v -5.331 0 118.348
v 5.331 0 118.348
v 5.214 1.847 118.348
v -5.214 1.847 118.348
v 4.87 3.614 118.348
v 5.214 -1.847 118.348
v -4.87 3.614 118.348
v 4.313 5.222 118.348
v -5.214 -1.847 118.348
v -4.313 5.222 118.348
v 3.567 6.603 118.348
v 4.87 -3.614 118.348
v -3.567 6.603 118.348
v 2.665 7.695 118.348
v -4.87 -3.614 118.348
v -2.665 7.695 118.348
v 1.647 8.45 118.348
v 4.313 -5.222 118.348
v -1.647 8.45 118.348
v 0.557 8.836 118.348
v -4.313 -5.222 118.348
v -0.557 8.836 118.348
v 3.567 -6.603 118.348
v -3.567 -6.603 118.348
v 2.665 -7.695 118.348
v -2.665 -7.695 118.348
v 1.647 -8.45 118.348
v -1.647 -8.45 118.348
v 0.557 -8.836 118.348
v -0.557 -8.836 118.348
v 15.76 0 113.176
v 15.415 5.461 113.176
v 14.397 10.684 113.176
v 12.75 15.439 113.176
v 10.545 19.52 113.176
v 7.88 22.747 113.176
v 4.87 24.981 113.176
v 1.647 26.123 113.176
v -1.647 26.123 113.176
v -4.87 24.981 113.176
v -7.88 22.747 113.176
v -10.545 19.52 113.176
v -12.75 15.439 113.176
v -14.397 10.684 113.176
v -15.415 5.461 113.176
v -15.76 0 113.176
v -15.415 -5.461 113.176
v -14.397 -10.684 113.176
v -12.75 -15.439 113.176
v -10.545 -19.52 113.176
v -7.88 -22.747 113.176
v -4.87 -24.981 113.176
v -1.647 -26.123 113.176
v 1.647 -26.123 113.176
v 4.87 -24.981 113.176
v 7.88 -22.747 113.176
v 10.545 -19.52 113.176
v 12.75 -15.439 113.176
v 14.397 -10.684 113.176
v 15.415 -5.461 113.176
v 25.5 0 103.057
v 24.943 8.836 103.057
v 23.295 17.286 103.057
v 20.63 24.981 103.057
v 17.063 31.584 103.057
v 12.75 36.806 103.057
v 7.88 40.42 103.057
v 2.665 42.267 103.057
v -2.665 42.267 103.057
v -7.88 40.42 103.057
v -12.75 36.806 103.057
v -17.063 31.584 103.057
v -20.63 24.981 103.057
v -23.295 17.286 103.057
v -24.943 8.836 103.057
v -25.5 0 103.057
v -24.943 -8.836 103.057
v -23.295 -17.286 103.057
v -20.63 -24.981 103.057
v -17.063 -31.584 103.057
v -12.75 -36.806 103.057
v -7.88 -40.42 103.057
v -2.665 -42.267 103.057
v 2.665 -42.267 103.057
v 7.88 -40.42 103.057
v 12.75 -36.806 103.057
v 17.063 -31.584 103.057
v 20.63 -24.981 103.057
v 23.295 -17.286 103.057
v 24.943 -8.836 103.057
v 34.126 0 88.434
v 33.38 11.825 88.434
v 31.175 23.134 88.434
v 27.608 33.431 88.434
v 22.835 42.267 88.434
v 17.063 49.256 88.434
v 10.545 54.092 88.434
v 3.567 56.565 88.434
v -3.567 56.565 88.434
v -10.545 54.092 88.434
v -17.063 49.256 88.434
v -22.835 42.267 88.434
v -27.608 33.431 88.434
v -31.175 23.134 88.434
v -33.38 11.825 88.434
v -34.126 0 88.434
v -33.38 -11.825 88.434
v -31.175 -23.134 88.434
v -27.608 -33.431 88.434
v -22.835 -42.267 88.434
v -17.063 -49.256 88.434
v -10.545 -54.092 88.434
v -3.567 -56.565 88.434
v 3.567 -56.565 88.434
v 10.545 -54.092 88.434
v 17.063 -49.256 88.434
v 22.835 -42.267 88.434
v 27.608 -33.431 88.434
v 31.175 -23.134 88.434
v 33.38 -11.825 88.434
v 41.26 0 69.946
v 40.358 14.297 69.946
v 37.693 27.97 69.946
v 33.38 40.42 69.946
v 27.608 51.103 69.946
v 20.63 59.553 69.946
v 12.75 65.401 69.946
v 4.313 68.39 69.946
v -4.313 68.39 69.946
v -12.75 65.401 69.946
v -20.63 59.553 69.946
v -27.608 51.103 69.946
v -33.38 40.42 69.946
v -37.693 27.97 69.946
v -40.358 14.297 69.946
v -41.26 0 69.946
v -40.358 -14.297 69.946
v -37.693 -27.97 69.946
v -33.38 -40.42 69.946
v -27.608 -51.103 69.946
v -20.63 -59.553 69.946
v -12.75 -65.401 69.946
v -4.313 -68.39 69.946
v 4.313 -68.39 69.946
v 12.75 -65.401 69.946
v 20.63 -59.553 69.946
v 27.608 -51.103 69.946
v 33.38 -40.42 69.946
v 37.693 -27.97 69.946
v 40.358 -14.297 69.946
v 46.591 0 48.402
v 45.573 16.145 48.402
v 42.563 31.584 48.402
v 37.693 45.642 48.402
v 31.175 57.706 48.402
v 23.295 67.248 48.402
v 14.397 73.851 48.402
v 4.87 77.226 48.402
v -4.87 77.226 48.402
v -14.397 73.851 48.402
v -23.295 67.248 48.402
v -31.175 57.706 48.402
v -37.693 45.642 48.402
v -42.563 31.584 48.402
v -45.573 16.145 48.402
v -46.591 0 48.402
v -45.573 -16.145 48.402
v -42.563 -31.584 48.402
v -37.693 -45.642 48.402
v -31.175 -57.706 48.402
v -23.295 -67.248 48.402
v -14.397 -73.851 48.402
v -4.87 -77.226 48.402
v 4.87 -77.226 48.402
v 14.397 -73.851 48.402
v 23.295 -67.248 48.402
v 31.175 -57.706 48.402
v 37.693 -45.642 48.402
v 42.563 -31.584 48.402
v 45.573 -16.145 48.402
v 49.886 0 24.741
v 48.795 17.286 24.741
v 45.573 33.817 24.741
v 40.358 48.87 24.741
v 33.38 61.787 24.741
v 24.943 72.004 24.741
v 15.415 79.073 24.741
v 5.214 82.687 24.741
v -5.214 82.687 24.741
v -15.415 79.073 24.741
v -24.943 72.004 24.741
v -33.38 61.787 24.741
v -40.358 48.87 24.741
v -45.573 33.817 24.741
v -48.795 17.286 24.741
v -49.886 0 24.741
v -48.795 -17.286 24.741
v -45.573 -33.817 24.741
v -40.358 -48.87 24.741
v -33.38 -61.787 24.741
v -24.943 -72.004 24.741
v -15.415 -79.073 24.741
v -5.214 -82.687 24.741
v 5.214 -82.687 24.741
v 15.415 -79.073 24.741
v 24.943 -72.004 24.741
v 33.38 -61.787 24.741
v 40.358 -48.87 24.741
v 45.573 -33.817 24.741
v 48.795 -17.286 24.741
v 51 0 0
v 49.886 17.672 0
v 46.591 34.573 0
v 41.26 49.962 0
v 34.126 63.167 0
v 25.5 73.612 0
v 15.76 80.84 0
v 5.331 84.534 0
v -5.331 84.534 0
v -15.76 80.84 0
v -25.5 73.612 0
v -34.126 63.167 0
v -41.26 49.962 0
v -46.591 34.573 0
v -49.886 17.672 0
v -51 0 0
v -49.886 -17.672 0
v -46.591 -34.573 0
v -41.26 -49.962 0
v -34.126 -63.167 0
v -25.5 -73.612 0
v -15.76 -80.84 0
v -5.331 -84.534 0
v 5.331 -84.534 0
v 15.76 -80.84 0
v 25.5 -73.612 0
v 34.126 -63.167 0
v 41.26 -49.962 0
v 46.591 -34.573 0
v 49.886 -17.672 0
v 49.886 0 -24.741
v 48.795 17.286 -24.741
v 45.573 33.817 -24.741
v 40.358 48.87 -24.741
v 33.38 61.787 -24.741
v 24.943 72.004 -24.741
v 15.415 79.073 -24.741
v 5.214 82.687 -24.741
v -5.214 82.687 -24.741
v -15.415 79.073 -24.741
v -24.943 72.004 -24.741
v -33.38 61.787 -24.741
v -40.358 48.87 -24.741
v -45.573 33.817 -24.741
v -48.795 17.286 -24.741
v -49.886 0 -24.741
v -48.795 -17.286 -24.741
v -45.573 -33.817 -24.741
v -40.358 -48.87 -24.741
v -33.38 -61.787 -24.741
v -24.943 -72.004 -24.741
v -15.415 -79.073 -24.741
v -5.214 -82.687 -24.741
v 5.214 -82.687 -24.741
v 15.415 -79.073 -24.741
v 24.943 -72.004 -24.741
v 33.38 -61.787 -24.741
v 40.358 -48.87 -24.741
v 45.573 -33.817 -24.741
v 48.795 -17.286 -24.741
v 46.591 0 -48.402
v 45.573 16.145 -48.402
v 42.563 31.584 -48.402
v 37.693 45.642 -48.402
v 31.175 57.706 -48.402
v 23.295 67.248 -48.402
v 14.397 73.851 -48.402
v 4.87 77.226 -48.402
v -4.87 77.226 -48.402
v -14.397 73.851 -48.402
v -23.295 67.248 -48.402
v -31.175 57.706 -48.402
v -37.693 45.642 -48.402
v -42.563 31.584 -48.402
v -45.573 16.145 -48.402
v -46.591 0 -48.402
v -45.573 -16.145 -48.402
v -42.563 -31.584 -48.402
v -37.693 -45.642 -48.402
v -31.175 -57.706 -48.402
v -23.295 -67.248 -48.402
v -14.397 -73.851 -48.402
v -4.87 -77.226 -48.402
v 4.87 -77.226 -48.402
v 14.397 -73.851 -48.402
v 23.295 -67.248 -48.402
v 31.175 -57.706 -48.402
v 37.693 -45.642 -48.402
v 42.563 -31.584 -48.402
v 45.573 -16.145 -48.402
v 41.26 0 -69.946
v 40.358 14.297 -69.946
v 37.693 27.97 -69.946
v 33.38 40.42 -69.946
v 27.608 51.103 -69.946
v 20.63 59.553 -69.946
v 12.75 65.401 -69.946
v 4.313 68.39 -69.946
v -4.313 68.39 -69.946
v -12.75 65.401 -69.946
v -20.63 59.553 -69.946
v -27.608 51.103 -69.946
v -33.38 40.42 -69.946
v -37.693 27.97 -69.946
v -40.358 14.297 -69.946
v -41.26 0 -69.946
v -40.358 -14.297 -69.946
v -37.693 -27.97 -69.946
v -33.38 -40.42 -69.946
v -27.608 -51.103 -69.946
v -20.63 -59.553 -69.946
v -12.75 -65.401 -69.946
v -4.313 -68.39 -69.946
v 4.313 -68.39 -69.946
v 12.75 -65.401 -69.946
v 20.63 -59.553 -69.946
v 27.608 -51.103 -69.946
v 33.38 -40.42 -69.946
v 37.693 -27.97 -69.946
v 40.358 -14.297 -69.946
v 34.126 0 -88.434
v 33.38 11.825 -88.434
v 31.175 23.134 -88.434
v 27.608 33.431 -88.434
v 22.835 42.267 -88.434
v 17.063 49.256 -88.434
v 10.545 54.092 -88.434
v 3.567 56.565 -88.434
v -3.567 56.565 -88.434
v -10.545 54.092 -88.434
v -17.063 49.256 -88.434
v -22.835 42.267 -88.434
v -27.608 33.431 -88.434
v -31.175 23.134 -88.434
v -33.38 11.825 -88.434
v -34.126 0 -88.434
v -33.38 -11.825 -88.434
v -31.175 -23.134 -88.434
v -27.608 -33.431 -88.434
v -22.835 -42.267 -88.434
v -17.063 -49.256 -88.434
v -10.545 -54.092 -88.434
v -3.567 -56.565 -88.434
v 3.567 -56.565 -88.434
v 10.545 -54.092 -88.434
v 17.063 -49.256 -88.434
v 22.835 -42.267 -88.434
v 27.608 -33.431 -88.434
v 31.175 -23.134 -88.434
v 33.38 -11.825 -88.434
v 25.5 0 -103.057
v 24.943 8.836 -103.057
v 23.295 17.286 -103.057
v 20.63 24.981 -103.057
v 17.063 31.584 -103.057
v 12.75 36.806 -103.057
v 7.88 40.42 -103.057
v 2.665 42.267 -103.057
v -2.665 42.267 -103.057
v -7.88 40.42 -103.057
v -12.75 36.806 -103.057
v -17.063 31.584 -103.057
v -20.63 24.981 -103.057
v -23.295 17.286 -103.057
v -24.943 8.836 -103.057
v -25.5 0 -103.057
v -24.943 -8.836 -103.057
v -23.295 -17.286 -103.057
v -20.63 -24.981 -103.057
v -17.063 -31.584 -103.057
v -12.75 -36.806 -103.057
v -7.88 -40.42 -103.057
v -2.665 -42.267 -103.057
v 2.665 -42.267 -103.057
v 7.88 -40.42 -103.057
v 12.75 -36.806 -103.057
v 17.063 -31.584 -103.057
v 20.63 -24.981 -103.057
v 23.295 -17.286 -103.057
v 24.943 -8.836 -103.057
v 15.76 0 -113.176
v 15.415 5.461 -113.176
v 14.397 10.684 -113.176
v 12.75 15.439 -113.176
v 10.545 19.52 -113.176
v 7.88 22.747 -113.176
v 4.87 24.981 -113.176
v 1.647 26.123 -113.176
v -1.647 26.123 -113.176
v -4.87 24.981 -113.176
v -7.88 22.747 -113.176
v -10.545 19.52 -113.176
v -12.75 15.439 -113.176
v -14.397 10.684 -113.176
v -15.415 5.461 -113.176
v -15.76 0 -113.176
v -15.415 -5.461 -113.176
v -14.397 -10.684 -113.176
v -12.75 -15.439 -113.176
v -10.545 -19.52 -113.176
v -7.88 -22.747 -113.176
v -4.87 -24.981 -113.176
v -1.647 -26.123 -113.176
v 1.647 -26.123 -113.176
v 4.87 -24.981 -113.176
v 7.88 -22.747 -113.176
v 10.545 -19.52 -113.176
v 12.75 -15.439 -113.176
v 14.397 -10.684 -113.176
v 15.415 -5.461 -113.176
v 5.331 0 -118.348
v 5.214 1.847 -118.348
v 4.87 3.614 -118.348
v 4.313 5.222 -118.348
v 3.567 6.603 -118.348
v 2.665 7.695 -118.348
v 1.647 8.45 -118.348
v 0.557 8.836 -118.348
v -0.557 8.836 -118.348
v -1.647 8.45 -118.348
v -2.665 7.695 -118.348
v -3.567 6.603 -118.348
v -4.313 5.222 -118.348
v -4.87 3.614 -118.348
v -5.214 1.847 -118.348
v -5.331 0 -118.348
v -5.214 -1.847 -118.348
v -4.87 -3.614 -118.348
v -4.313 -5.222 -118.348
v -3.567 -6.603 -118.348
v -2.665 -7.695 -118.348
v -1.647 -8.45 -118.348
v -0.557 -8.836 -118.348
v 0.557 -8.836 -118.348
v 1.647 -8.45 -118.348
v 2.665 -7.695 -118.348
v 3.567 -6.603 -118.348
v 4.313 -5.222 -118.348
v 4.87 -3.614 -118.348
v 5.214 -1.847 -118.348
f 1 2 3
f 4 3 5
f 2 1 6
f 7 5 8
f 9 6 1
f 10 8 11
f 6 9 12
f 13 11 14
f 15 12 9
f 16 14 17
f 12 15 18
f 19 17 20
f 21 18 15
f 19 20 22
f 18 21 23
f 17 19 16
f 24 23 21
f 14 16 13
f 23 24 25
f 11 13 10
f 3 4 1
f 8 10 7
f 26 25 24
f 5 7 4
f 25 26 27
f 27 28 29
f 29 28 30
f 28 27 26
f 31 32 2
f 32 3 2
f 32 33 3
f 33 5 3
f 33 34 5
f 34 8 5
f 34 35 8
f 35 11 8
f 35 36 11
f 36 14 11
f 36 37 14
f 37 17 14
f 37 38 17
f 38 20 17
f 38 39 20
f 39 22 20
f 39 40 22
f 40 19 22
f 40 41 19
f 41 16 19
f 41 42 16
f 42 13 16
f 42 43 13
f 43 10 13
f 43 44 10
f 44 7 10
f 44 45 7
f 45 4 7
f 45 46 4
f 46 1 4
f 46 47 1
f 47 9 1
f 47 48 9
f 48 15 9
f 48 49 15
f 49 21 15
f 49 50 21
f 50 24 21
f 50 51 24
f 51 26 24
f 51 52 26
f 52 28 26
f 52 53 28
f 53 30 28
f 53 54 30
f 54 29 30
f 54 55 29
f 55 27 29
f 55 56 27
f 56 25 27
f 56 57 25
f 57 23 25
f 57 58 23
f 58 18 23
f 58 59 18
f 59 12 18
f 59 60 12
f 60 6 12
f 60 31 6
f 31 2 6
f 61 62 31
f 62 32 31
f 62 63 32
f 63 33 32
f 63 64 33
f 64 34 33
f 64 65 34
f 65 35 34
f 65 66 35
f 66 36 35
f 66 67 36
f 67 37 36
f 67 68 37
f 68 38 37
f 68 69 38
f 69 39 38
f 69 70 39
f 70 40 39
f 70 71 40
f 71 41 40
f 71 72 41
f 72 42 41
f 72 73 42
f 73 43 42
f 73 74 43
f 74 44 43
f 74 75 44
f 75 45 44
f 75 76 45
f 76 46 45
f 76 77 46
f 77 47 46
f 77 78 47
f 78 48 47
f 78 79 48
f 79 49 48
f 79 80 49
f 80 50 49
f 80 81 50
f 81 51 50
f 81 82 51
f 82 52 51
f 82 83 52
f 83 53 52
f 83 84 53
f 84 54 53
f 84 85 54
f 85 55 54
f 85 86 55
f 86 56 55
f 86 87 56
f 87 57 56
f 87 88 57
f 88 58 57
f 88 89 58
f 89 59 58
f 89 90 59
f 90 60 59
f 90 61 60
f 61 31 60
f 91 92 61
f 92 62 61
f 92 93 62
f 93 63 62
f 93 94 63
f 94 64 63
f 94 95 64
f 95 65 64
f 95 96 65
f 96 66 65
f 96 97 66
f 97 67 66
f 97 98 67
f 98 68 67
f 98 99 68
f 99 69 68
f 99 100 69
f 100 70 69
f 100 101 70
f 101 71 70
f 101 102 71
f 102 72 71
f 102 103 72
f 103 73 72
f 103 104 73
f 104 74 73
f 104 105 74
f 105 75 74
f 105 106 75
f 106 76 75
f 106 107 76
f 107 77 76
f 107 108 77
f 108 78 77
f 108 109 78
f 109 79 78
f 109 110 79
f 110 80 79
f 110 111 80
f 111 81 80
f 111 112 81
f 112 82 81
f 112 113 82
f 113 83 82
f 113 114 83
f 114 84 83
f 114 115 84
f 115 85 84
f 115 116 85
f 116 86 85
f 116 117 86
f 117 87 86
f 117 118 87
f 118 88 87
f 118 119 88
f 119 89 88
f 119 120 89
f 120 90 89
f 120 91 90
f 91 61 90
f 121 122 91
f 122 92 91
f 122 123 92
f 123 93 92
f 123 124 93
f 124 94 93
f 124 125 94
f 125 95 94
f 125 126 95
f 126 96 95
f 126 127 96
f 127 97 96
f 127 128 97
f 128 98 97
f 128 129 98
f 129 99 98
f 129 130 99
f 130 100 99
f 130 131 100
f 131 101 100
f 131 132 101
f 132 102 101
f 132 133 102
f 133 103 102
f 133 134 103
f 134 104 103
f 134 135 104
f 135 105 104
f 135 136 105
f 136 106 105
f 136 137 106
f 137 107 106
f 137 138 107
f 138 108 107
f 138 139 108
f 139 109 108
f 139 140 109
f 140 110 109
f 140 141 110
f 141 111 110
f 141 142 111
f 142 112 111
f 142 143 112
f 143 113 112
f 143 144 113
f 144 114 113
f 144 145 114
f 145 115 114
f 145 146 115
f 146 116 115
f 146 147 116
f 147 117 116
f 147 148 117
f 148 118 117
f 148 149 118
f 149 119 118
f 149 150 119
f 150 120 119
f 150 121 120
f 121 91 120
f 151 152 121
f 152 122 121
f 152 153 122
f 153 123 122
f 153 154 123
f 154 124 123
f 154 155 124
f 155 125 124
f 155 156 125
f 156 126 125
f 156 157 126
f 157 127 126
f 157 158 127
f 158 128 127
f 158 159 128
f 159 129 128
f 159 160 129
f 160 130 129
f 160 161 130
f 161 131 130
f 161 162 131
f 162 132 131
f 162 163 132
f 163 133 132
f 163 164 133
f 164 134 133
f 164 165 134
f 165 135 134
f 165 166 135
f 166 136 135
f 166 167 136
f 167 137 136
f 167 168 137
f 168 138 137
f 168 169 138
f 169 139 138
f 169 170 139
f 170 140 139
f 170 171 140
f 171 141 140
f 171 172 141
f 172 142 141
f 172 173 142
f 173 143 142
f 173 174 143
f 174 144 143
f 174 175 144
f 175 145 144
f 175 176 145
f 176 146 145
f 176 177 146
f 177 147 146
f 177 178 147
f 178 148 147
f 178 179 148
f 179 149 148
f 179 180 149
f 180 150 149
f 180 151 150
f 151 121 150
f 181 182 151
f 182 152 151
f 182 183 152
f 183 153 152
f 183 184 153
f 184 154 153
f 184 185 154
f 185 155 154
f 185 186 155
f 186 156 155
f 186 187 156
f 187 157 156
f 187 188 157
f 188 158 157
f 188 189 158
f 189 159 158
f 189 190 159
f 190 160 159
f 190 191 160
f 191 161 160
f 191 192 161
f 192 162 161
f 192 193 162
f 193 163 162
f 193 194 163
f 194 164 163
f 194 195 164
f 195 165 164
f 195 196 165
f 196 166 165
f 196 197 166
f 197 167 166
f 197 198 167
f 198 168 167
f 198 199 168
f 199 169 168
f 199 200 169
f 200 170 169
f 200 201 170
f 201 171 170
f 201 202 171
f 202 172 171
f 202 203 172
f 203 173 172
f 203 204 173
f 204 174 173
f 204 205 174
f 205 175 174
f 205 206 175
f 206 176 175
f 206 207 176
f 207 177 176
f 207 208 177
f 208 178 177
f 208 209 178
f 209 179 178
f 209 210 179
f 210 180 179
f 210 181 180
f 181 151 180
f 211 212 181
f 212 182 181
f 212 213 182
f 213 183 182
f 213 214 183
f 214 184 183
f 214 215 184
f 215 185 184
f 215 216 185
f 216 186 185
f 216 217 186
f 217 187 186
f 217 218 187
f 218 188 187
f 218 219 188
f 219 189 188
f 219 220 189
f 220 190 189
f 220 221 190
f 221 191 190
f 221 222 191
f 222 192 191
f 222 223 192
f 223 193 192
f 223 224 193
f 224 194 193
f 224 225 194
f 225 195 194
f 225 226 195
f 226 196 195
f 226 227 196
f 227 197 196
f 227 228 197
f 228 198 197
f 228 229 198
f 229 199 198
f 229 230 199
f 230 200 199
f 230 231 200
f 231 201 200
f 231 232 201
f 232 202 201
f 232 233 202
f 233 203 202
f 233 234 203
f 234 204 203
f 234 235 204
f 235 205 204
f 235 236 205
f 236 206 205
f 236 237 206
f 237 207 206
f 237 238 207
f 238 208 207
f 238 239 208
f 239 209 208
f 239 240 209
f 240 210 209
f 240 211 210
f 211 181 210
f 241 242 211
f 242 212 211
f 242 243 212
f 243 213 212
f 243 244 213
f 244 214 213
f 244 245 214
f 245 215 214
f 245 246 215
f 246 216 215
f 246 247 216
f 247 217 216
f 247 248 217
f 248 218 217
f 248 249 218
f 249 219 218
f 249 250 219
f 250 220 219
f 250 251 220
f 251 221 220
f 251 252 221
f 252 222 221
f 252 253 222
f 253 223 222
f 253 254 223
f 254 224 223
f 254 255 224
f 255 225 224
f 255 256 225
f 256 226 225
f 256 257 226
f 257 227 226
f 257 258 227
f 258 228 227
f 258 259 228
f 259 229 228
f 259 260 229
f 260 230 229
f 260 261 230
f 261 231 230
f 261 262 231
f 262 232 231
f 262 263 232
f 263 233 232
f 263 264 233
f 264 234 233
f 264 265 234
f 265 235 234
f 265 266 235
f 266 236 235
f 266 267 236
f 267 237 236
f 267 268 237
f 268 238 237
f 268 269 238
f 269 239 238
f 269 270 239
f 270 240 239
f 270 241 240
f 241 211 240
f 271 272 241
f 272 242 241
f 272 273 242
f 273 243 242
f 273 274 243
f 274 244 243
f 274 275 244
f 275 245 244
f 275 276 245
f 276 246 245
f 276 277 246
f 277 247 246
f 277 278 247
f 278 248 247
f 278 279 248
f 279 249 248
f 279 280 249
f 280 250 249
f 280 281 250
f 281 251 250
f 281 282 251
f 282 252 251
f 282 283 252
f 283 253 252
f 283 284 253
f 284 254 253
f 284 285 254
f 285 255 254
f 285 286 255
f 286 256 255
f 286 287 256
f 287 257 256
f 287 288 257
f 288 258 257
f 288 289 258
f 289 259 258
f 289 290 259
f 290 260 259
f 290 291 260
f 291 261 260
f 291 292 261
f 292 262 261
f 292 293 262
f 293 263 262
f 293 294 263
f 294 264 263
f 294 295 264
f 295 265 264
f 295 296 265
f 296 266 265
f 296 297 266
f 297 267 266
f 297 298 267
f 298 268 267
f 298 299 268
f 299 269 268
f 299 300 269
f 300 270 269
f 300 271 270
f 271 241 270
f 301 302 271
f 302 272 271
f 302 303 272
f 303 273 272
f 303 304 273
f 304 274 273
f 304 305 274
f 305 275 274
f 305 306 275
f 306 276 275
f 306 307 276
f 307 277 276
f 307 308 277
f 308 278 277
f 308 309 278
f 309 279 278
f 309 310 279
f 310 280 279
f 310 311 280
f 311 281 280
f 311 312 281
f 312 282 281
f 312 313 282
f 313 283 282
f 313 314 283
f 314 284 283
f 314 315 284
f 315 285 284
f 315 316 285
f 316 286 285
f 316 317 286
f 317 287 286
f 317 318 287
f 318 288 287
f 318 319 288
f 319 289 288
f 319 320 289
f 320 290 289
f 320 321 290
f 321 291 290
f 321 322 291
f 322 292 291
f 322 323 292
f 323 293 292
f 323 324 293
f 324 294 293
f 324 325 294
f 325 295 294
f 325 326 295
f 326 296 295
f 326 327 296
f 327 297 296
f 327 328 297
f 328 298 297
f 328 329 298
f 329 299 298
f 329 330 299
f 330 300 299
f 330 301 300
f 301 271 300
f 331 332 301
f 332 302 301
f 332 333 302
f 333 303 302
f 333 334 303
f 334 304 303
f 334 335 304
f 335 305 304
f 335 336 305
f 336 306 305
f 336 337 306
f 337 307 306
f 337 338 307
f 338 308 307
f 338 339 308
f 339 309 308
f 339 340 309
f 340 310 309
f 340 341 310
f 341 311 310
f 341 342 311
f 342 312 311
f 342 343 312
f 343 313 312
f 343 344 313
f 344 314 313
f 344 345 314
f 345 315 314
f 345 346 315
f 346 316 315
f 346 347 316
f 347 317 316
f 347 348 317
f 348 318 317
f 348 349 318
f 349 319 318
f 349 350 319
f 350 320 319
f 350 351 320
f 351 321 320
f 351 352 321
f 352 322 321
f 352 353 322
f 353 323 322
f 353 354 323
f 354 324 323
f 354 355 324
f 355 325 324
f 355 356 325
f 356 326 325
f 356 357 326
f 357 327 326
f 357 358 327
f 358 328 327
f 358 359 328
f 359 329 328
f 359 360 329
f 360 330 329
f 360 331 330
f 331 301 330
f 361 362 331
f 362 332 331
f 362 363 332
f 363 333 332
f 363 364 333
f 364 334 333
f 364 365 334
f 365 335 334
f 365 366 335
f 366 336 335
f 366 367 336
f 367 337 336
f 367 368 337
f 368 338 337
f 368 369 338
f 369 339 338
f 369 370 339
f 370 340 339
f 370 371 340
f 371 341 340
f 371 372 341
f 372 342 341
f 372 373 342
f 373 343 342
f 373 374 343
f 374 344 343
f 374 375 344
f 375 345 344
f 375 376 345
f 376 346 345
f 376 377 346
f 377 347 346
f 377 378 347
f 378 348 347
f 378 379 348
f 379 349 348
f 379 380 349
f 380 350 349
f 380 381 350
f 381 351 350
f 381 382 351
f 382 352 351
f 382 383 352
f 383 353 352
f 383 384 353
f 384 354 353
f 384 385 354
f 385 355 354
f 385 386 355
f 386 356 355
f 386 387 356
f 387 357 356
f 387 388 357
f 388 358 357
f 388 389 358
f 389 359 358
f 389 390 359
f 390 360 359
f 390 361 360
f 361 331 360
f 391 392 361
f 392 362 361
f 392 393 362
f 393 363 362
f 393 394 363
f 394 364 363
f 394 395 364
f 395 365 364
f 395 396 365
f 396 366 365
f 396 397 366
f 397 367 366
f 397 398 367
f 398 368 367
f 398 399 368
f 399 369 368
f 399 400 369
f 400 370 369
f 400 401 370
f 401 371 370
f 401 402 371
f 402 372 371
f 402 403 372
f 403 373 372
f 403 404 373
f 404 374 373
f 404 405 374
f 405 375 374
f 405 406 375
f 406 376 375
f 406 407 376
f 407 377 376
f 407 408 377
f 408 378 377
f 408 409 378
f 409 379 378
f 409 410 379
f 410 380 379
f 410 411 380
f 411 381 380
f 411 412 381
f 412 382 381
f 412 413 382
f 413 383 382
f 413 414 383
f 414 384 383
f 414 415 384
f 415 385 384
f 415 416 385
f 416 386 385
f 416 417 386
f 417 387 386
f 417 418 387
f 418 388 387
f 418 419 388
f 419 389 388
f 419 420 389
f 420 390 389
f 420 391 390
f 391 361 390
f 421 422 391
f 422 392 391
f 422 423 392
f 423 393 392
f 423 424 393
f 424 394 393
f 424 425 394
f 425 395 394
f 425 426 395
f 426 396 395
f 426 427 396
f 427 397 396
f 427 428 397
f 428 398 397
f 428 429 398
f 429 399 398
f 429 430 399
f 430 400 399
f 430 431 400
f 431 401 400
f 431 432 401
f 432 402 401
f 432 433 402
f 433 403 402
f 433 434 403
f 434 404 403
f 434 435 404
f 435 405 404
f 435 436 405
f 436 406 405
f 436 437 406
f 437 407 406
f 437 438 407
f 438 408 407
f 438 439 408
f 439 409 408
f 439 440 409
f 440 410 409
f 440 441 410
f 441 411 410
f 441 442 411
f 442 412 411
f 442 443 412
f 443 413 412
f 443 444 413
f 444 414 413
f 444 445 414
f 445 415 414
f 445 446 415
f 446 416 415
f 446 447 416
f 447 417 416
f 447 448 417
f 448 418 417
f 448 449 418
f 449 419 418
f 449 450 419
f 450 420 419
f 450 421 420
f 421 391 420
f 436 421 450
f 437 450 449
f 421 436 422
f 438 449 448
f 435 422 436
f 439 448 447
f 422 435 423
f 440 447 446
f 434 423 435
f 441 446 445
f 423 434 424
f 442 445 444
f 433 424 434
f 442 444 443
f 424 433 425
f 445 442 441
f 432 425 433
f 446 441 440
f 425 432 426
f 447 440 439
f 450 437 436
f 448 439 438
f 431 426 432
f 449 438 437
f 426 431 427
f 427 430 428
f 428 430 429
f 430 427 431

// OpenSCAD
// Generated by SolidPython 1.0.1 on 2020-07-29 00:39:25


scale(v = [3, 5, 7]) {
	sphere(r = 17);
}
/***********************************************
*********      SolidPython code:      **********
************************************************
 
# import packages: SolidPython
from solid import *
from solid.utils import *
from itertools import chain, combinations


class Resize:

    def __init__(self, scad_file):
        self.scad_file = scad_file
        #self.scad_file = import_scad(scad_file)
        # cone/cylinder param:
        self.r1 = 0
        self.r2 = 0
        self.h = 0
        # rectangular prism param:
        self.w = 0
        self.l = 0
        # ellipse param:
        self.r = 0

    # import OpenScad code (file name corresponds to shape)


    # classify shape + parameters
    def assign(self, param1, param2, param3):
        if self.scad_file == 'cone.scad':
            self.r1 = param1
            self.r2 = param2
            self.h = param3
        elif self.scad_file == 'cylinder.scad':
            self.r1 = param1
            self.r2 = param2
            self.h = param3
        elif self.scad_file == 'rectangularPrism.scad':
            self.h = param1
            self.l = param2
            self.w = param3
        else:
            self.r = param1
            self.h = param2

    # resize parameters
    def iterate(self):
        x = range(3, 20, 2)
        i = 1
        if self.scad_file == 'cone.scad':
            tempList = list(combinations(x, 2))
            for temp in tempList:
                param1 = temp[0]
                param2 = temp[1]
                filepath = 'produced_scad_files/' + 'cone' + str(param1) + '_' + str(param2) + '_' + '.scad'
                scad_render_to_file(cylinder(h=param1, r1=param2, r2=0), filepath)

        elif self.scad_file == 'cylinder.scad':
            tempList = list(combinations(x, 3))
            for temp in tempList:
                param1 = temp[0]
                param2 = temp[1]
                filepath = 'produced_scad_files/' + 'cylinder' + str(param1) + '_' + str(param2) + '_' + '.scad'
                scad_render_to_file(cylinder(h=param1, r1=param2, r2=param2), filepath)

        elif self.scad_file == 'rectangularPrism.scad':
            tempList = list(combinations(x, 3))
            for temp in tempList:
                param1 = temp[0]
                param2 = temp[1]
                param3 = temp[2]
                filepath = 'produced_scad_files/' + 'rectangularPrism' + str(param1) + '_' + str(param2) + '_' + str(
                    param3) + '.scad'
                scad_render_to_file(cube(size=(param1, param2, param3)), filepath)

        elif self.scad_file == 'ellipse.scad':
            tempList = list(combinations(x, 4))
            for temp in tempList:
                param1 = temp[0]
                param2 = temp[1]
                param3 = temp[2]
                param4 = temp[3]
                filepath = 'produced_scad_files/' + 'ellipse' + str(param1) + '_' + str(param2) + '_' + str(param3) + '_' + str(param4) + '.scad'
                scad_render_to_file(scale([param1, param2, param3])(sphere(r=param4)), filepath)

    def render_to_scadfile(self):
        scad_render_to_file(scad, 'example.scad') 
 
************************************************/
